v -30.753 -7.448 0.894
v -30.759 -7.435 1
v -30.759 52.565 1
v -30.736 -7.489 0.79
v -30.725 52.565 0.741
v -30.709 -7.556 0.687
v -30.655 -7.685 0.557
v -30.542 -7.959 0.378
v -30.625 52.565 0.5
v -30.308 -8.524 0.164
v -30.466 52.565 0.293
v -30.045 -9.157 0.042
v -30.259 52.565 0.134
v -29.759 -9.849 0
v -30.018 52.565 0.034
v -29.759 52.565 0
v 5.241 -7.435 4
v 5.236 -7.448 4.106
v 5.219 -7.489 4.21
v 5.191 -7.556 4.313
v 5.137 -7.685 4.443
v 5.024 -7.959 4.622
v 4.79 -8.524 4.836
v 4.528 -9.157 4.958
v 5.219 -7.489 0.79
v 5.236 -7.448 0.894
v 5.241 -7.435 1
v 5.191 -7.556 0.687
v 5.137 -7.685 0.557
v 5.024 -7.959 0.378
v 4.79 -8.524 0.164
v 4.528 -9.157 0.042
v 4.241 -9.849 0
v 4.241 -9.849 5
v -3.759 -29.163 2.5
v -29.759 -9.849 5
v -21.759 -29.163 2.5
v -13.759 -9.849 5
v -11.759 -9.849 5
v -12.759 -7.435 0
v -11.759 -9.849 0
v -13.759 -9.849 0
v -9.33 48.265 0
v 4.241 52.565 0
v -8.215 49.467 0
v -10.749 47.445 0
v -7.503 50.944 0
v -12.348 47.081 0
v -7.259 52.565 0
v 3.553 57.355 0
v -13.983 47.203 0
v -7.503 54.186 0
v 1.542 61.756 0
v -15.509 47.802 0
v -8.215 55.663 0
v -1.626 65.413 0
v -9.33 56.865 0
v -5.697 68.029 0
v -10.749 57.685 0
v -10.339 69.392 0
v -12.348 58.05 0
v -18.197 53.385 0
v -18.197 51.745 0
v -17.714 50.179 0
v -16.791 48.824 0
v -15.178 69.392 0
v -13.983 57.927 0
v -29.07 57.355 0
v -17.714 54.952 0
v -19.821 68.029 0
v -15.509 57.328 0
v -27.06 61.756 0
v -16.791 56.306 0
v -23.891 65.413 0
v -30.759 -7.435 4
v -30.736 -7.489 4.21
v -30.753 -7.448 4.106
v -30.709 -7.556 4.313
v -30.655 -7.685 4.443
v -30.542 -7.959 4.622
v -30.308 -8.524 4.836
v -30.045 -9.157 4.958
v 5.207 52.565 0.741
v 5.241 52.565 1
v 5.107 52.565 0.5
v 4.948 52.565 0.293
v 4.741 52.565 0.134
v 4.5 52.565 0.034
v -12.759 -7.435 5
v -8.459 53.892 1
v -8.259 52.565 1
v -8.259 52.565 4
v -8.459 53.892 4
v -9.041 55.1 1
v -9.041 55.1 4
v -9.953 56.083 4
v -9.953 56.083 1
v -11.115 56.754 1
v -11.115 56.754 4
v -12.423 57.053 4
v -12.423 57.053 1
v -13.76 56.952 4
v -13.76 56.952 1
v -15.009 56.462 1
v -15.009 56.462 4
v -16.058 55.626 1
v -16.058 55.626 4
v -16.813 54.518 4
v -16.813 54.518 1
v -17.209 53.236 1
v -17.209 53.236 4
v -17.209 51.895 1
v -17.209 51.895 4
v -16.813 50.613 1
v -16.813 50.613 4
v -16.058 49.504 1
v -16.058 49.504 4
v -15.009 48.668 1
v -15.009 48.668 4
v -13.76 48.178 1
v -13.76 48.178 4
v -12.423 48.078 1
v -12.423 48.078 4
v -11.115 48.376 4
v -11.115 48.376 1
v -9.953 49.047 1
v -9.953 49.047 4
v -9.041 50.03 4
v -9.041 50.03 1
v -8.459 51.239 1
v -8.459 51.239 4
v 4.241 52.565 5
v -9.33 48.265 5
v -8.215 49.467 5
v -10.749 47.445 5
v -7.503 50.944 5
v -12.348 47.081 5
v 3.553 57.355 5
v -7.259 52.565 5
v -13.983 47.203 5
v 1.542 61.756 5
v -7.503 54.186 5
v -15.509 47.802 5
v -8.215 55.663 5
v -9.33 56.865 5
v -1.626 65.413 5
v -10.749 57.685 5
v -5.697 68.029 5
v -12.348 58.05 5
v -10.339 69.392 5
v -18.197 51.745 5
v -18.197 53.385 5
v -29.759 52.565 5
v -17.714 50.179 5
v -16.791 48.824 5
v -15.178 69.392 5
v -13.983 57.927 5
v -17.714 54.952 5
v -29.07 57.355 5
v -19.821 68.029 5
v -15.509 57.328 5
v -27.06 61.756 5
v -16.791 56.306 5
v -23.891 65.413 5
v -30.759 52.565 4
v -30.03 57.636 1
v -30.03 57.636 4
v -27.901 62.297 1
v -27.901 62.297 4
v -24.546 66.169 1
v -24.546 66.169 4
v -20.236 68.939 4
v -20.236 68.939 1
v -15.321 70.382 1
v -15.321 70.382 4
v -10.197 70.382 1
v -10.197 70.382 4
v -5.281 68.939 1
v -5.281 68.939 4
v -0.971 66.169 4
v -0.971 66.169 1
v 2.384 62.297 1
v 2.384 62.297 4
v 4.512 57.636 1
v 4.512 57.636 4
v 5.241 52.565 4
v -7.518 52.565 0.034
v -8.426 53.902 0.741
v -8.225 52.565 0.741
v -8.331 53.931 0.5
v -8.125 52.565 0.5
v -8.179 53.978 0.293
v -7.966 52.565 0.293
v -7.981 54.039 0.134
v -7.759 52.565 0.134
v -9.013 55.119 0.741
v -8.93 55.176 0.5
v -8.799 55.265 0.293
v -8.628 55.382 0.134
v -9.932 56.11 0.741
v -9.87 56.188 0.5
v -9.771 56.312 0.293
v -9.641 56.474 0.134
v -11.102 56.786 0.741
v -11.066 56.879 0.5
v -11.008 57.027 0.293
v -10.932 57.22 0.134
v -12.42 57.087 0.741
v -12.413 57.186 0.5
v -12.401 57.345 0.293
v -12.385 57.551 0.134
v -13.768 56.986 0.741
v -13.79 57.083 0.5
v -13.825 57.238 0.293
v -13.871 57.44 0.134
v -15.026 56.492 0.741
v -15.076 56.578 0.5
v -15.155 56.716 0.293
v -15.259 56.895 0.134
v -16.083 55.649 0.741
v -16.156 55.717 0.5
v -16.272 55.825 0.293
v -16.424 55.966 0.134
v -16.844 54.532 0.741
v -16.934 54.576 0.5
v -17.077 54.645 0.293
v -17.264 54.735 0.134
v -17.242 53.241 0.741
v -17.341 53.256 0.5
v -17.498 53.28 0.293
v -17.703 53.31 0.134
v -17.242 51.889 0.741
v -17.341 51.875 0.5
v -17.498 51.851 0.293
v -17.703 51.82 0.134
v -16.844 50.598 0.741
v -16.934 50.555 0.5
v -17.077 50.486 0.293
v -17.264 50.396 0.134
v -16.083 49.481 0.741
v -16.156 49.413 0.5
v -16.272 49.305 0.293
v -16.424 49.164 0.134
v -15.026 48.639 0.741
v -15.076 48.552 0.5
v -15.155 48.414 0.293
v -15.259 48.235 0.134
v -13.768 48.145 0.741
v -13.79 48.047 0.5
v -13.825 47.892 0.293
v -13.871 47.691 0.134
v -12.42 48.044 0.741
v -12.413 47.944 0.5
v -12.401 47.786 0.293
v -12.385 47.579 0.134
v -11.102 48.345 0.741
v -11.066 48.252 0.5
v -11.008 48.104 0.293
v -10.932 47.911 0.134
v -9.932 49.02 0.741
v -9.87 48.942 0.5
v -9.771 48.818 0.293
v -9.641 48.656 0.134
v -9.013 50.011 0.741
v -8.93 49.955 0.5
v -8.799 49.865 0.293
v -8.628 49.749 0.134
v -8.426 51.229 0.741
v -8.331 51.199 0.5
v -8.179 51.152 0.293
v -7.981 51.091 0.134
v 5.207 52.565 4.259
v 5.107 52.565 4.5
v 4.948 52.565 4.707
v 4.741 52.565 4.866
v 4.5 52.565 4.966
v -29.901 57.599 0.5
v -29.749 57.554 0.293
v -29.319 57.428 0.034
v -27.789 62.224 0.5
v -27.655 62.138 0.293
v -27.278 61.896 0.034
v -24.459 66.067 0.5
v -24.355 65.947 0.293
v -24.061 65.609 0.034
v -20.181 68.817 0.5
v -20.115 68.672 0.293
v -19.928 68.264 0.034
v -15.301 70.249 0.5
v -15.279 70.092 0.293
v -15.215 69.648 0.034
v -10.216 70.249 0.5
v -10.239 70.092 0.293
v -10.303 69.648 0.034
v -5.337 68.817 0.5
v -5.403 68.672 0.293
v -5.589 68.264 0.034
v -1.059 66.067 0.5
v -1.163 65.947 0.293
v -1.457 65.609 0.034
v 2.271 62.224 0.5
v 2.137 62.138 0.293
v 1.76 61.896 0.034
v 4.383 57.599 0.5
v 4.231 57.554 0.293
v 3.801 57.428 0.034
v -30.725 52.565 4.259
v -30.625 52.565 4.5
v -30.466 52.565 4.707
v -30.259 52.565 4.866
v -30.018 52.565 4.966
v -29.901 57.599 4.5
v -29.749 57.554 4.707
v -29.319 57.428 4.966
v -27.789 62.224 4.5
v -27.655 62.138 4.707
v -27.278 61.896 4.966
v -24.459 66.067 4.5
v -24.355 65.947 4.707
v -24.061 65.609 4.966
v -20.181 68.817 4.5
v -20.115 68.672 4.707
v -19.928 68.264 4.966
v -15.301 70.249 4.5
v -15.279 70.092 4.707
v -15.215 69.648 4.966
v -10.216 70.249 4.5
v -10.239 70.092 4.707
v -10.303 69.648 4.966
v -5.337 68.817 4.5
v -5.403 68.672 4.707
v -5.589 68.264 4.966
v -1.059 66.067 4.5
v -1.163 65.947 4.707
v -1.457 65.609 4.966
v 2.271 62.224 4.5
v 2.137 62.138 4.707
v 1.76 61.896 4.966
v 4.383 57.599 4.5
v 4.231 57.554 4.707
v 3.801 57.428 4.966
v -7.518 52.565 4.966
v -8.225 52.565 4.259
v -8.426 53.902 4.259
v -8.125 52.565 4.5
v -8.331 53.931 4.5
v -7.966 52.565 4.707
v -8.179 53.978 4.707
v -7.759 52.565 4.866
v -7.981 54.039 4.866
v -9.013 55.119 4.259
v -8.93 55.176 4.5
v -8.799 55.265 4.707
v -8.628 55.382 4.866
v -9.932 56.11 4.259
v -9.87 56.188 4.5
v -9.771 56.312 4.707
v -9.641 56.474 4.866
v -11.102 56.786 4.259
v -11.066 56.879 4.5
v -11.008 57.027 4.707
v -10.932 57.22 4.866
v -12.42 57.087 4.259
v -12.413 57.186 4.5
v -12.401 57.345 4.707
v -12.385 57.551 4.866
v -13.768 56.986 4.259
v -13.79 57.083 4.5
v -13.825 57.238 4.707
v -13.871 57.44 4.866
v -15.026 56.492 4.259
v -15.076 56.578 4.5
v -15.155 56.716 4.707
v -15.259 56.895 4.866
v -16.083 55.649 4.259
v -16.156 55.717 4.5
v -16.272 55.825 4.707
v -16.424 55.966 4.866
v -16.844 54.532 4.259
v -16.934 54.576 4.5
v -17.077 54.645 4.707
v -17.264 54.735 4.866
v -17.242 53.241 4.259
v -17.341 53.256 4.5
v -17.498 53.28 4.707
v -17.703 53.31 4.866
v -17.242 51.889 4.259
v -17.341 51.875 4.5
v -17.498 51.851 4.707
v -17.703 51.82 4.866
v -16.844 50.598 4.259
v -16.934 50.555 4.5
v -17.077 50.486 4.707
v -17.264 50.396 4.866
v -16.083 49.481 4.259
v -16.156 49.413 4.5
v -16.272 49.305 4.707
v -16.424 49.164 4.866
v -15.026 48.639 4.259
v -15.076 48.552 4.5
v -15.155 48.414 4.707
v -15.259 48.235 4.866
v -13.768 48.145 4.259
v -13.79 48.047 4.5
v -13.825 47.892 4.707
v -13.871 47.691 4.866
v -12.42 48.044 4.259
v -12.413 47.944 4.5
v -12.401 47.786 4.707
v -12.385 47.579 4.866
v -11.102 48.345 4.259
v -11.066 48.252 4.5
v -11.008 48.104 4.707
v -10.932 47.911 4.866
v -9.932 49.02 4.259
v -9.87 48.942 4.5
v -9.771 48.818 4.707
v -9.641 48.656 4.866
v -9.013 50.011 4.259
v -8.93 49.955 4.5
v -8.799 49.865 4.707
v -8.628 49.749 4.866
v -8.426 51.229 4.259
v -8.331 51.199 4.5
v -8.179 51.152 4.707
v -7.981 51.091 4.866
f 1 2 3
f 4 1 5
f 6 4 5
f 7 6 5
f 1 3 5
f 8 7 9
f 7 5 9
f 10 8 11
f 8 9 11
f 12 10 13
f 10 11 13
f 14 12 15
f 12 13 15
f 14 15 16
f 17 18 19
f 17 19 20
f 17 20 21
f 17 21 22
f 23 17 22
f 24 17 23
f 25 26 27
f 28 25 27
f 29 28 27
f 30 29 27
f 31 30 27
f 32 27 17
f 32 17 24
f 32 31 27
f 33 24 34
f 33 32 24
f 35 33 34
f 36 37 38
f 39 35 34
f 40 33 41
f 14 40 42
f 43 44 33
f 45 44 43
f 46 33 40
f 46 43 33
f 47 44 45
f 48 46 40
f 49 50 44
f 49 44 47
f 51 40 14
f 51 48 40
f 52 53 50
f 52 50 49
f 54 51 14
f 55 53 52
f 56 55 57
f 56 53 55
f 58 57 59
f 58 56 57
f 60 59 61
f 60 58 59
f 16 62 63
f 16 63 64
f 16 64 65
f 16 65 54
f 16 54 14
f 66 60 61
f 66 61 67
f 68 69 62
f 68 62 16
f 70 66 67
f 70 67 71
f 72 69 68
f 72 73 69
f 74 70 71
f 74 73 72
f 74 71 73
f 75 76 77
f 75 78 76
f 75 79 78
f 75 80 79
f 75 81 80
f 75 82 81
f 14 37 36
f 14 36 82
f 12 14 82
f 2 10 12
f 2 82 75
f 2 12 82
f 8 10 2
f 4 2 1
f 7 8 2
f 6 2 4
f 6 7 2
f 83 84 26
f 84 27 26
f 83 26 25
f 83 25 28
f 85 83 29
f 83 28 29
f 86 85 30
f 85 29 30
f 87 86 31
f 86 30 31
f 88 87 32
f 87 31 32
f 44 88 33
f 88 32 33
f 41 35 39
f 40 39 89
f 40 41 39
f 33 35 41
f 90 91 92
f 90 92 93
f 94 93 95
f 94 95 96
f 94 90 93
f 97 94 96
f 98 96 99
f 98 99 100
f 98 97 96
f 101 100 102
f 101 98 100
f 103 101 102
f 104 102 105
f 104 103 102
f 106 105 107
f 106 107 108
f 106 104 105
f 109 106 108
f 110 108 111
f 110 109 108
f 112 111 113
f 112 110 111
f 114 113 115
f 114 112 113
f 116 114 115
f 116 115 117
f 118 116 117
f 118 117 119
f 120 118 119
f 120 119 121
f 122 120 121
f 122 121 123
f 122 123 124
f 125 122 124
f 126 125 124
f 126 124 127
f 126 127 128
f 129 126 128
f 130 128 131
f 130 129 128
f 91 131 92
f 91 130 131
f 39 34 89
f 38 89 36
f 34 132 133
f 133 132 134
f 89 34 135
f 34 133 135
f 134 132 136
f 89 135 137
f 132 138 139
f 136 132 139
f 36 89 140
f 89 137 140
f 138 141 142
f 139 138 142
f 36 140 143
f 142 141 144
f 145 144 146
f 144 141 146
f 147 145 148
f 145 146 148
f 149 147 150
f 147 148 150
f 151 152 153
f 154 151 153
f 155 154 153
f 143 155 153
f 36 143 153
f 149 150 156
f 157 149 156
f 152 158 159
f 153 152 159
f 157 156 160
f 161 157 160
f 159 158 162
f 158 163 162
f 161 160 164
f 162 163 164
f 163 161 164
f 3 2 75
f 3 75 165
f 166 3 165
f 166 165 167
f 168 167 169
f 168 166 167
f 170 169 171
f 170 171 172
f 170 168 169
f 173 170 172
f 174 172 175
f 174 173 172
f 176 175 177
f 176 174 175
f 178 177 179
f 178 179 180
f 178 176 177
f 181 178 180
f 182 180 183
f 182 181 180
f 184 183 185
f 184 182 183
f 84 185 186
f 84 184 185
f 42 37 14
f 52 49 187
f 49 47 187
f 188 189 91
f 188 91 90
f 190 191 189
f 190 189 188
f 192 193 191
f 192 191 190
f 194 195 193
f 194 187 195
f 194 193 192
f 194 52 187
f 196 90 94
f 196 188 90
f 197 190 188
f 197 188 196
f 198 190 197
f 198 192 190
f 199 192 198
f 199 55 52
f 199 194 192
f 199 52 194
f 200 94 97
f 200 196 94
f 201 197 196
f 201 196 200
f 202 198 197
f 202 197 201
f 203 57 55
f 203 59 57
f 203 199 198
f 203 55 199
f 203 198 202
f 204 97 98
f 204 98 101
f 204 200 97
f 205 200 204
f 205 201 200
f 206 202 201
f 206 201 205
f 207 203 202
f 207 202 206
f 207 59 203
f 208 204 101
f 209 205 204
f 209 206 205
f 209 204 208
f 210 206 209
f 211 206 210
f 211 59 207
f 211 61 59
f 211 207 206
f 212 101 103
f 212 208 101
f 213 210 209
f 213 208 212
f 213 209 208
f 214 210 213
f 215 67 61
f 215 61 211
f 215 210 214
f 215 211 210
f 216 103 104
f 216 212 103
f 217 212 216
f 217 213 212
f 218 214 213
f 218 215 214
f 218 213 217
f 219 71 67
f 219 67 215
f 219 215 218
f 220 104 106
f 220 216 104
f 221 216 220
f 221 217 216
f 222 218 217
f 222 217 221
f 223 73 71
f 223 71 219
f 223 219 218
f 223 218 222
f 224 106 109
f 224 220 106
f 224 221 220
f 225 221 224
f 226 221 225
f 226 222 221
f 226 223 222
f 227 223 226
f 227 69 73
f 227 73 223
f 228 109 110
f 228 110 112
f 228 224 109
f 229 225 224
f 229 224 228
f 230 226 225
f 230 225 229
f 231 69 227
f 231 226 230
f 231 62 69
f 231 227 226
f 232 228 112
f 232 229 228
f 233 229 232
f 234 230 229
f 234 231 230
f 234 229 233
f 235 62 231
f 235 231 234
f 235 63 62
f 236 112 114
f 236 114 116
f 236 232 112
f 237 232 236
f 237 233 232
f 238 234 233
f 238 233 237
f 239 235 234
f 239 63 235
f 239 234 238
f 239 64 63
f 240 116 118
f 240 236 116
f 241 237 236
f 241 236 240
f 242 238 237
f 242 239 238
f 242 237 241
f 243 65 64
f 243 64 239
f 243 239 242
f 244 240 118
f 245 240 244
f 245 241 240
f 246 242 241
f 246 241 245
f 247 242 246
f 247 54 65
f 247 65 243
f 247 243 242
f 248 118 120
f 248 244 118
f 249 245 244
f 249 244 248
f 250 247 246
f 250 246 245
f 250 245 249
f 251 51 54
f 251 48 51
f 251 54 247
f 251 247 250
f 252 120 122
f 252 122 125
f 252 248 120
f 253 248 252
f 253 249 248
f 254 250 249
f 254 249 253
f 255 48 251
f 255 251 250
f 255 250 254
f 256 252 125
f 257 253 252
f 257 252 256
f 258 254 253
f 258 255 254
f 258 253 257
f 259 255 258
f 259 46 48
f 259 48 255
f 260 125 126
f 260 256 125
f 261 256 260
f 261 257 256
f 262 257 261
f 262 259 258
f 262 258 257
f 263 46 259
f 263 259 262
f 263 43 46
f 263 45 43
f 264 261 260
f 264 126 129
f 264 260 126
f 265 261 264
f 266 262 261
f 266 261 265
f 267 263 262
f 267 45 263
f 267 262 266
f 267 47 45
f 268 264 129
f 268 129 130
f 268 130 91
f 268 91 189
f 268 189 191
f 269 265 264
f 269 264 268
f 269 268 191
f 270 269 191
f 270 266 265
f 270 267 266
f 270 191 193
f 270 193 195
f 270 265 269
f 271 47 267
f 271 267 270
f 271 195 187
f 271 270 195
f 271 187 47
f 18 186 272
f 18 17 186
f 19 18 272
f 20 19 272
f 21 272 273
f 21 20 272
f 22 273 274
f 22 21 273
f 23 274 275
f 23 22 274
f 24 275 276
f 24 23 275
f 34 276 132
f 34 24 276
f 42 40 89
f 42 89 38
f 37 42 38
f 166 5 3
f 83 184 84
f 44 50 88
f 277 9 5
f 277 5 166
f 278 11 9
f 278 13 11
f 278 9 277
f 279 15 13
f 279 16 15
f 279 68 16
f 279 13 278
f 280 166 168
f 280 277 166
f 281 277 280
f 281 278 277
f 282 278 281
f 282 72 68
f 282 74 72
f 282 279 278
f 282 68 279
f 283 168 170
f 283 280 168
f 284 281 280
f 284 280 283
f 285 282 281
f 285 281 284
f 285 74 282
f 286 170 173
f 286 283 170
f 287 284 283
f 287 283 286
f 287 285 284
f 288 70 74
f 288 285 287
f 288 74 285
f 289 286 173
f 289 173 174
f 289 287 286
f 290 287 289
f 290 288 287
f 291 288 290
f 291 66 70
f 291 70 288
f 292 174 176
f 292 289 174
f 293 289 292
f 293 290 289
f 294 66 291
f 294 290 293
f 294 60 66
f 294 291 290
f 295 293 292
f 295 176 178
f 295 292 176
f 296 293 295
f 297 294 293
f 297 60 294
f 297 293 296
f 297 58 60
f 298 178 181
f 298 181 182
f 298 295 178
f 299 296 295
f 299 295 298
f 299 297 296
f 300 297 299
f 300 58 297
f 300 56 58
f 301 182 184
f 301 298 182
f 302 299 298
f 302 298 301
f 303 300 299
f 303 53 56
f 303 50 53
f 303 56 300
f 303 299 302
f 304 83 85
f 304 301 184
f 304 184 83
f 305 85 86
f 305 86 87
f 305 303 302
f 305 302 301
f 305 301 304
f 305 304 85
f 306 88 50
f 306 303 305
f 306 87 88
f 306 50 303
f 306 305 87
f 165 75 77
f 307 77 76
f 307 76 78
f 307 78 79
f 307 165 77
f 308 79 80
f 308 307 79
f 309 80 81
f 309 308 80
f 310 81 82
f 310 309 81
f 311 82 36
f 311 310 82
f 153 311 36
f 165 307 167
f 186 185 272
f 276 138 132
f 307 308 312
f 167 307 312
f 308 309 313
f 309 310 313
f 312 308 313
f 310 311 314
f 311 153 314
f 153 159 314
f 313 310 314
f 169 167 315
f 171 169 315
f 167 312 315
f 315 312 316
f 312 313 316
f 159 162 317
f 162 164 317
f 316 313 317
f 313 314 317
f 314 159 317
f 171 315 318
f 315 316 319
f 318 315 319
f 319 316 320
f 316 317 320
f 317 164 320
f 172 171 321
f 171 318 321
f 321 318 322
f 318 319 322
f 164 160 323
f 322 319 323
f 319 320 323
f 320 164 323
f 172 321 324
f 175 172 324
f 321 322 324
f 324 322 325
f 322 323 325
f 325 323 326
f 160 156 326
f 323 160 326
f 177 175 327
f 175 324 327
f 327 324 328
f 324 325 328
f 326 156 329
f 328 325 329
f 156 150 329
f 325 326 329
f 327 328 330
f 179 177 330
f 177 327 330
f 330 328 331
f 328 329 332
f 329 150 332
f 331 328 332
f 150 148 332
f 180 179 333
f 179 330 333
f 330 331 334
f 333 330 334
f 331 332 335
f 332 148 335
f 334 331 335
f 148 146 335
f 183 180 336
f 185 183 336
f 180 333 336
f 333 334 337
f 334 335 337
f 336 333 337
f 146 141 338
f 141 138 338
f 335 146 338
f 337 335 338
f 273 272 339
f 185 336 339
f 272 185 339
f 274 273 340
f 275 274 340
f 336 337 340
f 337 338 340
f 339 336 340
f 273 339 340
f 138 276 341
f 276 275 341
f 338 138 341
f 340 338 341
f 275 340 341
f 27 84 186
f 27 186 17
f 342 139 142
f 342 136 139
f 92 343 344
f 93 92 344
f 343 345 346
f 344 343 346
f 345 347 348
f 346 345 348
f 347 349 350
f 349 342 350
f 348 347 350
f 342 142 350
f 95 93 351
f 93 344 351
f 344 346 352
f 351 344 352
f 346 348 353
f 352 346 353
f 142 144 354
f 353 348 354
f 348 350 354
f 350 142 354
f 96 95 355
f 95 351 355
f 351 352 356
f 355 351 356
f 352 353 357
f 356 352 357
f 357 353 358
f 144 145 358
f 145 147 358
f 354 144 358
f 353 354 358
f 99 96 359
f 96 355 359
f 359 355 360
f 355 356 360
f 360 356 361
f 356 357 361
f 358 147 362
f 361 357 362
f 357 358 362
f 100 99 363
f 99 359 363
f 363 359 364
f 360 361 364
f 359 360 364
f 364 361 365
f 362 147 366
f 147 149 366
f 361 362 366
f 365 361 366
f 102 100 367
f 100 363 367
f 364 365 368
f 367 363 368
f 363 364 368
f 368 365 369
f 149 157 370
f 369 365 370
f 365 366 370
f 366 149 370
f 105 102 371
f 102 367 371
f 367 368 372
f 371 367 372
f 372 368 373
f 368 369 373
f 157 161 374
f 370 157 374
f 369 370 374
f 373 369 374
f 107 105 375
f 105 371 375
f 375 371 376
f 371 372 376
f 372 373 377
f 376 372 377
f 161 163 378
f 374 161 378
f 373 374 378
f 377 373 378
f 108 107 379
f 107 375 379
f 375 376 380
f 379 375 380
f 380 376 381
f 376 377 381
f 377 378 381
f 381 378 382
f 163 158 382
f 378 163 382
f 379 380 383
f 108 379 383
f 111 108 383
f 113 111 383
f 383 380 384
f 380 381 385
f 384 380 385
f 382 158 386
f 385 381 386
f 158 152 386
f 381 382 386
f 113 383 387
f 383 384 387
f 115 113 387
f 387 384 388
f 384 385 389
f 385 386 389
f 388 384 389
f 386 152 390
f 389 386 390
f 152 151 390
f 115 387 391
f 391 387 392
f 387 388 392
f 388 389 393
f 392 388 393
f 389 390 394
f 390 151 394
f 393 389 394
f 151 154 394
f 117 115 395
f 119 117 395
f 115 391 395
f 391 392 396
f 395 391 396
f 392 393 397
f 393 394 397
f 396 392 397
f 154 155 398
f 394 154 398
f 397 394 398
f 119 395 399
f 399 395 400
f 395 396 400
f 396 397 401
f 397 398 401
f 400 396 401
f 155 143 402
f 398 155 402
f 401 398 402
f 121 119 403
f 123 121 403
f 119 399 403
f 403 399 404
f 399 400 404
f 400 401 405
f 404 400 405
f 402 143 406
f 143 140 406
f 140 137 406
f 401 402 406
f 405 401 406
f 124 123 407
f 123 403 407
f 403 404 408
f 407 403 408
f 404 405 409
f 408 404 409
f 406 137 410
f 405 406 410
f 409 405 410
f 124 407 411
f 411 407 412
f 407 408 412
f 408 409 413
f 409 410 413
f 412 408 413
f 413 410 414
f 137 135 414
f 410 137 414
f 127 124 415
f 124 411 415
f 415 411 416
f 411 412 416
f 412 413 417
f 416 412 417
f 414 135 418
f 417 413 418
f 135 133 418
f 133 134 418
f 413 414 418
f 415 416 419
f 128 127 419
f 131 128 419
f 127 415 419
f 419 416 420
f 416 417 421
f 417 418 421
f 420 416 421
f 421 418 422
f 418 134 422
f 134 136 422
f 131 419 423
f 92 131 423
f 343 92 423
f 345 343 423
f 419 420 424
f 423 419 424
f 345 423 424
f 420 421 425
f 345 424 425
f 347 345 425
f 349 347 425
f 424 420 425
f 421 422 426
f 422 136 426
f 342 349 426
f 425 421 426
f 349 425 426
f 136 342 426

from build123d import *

# Parameters (mm, degrees)
SKETCH1_R               = 4.5
BOSS_EXTRUDE1_DEPTH     = 5
FILLET1_R               = 1
CUT_EXTRUDE1_DEPTH      = 78.139851996
CUT_EXTRUDE1_DEPTH_BACK = 78.139851996
CUT_EXTRUDE3_DEPTH      = 80.375373419
CUT_EXTRUDE3_DEPTH_BACK = 80.375373419


with BuildPart() as part:
    # Sketch1 → Boss-Extrude1 (new body)
    with BuildSketch(Plane.XY):
        with BuildLine():
            Line((-21.758850115, -29.16270467), (-30.758850115, -7.434782609))
            Line((-30.758850115, -7.434782609), (-30.758850115, 52.565217391))
            ThreePointArc((-30.758850115, 52.565217391), (-12.758850115, 70.565217391), (5.241149885, 52.565217391))
            Line((5.241149885, 52.565217391), (5.241149885, -7.434782609))
            Line((5.241149885, -7.434782609), (-3.758850115, -29.16270467))
            Line((-3.758850115, -29.16270467), (-12.758850115, -7.434782609))
            Line((-12.758850115, -7.434782609), (-21.758850115, -29.16270467))
        make_face()
        with Locations((-12.758850115, 52.565217391)):
            Circle(SKETCH1_R, mode=Mode.SUBTRACT)
    extrude(amount=BOSS_EXTRUDE1_DEPTH)

    # Fillet1
    fillet1_edges = [part.edges().sort_by_distance(p)[0] for p in [
        (5.241149885, 22.565217391, 5),
        (-17.258850115, 52.565217391, 0),
        (-17.258850115, 52.565217391, 5),
        (-12.758850115, 70.565217391, 5),
        (-30.758850115, 22.565217391, 5),
        (-30.758850115, 22.565217391, 0),
        (-12.758850115, 70.565217391, 0),
        (5.241149885, 22.565217391, 0),
    ]]
    fillet(fillet1_edges, radius=FILLET1_R)

    # Sketch5 → Cut-Extrude1 (cut, two sides: drawn at the far end of the back side and taken through both)
    with BuildSketch(Plane(origin=(0, 0, 0), x_dir=(0, 0, -1), z_dir=(1, 0, 0)).offset(-CUT_EXTRUDE1_DEPTH_BACK)):
        Polygon((-2.5, -29.16270467), (-5, -9.848996171), (-5, -29.16270467), align=None)
    extrude(amount=CUT_EXTRUDE1_DEPTH + CUT_EXTRUDE1_DEPTH_BACK, mode=Mode.SUBTRACT)

    # Sketch9 → Cut-Extrude3 (cut, two sides: drawn at the far end of the back side and taken through both)
    with BuildSketch(Plane(origin=(5.241149885, 0, 0), x_dir=(0, 0, -1), z_dir=(1, 0, 0)).offset(-CUT_EXTRUDE3_DEPTH_BACK)):
        Polygon((-2.5, -29.16270467), (0, -9.848996171), (0, -29.16270467), align=None)
    extrude(amount=CUT_EXTRUDE3_DEPTH + CUT_EXTRUDE3_DEPTH_BACK, mode=Mode.SUBTRACT)


solid = part.part
